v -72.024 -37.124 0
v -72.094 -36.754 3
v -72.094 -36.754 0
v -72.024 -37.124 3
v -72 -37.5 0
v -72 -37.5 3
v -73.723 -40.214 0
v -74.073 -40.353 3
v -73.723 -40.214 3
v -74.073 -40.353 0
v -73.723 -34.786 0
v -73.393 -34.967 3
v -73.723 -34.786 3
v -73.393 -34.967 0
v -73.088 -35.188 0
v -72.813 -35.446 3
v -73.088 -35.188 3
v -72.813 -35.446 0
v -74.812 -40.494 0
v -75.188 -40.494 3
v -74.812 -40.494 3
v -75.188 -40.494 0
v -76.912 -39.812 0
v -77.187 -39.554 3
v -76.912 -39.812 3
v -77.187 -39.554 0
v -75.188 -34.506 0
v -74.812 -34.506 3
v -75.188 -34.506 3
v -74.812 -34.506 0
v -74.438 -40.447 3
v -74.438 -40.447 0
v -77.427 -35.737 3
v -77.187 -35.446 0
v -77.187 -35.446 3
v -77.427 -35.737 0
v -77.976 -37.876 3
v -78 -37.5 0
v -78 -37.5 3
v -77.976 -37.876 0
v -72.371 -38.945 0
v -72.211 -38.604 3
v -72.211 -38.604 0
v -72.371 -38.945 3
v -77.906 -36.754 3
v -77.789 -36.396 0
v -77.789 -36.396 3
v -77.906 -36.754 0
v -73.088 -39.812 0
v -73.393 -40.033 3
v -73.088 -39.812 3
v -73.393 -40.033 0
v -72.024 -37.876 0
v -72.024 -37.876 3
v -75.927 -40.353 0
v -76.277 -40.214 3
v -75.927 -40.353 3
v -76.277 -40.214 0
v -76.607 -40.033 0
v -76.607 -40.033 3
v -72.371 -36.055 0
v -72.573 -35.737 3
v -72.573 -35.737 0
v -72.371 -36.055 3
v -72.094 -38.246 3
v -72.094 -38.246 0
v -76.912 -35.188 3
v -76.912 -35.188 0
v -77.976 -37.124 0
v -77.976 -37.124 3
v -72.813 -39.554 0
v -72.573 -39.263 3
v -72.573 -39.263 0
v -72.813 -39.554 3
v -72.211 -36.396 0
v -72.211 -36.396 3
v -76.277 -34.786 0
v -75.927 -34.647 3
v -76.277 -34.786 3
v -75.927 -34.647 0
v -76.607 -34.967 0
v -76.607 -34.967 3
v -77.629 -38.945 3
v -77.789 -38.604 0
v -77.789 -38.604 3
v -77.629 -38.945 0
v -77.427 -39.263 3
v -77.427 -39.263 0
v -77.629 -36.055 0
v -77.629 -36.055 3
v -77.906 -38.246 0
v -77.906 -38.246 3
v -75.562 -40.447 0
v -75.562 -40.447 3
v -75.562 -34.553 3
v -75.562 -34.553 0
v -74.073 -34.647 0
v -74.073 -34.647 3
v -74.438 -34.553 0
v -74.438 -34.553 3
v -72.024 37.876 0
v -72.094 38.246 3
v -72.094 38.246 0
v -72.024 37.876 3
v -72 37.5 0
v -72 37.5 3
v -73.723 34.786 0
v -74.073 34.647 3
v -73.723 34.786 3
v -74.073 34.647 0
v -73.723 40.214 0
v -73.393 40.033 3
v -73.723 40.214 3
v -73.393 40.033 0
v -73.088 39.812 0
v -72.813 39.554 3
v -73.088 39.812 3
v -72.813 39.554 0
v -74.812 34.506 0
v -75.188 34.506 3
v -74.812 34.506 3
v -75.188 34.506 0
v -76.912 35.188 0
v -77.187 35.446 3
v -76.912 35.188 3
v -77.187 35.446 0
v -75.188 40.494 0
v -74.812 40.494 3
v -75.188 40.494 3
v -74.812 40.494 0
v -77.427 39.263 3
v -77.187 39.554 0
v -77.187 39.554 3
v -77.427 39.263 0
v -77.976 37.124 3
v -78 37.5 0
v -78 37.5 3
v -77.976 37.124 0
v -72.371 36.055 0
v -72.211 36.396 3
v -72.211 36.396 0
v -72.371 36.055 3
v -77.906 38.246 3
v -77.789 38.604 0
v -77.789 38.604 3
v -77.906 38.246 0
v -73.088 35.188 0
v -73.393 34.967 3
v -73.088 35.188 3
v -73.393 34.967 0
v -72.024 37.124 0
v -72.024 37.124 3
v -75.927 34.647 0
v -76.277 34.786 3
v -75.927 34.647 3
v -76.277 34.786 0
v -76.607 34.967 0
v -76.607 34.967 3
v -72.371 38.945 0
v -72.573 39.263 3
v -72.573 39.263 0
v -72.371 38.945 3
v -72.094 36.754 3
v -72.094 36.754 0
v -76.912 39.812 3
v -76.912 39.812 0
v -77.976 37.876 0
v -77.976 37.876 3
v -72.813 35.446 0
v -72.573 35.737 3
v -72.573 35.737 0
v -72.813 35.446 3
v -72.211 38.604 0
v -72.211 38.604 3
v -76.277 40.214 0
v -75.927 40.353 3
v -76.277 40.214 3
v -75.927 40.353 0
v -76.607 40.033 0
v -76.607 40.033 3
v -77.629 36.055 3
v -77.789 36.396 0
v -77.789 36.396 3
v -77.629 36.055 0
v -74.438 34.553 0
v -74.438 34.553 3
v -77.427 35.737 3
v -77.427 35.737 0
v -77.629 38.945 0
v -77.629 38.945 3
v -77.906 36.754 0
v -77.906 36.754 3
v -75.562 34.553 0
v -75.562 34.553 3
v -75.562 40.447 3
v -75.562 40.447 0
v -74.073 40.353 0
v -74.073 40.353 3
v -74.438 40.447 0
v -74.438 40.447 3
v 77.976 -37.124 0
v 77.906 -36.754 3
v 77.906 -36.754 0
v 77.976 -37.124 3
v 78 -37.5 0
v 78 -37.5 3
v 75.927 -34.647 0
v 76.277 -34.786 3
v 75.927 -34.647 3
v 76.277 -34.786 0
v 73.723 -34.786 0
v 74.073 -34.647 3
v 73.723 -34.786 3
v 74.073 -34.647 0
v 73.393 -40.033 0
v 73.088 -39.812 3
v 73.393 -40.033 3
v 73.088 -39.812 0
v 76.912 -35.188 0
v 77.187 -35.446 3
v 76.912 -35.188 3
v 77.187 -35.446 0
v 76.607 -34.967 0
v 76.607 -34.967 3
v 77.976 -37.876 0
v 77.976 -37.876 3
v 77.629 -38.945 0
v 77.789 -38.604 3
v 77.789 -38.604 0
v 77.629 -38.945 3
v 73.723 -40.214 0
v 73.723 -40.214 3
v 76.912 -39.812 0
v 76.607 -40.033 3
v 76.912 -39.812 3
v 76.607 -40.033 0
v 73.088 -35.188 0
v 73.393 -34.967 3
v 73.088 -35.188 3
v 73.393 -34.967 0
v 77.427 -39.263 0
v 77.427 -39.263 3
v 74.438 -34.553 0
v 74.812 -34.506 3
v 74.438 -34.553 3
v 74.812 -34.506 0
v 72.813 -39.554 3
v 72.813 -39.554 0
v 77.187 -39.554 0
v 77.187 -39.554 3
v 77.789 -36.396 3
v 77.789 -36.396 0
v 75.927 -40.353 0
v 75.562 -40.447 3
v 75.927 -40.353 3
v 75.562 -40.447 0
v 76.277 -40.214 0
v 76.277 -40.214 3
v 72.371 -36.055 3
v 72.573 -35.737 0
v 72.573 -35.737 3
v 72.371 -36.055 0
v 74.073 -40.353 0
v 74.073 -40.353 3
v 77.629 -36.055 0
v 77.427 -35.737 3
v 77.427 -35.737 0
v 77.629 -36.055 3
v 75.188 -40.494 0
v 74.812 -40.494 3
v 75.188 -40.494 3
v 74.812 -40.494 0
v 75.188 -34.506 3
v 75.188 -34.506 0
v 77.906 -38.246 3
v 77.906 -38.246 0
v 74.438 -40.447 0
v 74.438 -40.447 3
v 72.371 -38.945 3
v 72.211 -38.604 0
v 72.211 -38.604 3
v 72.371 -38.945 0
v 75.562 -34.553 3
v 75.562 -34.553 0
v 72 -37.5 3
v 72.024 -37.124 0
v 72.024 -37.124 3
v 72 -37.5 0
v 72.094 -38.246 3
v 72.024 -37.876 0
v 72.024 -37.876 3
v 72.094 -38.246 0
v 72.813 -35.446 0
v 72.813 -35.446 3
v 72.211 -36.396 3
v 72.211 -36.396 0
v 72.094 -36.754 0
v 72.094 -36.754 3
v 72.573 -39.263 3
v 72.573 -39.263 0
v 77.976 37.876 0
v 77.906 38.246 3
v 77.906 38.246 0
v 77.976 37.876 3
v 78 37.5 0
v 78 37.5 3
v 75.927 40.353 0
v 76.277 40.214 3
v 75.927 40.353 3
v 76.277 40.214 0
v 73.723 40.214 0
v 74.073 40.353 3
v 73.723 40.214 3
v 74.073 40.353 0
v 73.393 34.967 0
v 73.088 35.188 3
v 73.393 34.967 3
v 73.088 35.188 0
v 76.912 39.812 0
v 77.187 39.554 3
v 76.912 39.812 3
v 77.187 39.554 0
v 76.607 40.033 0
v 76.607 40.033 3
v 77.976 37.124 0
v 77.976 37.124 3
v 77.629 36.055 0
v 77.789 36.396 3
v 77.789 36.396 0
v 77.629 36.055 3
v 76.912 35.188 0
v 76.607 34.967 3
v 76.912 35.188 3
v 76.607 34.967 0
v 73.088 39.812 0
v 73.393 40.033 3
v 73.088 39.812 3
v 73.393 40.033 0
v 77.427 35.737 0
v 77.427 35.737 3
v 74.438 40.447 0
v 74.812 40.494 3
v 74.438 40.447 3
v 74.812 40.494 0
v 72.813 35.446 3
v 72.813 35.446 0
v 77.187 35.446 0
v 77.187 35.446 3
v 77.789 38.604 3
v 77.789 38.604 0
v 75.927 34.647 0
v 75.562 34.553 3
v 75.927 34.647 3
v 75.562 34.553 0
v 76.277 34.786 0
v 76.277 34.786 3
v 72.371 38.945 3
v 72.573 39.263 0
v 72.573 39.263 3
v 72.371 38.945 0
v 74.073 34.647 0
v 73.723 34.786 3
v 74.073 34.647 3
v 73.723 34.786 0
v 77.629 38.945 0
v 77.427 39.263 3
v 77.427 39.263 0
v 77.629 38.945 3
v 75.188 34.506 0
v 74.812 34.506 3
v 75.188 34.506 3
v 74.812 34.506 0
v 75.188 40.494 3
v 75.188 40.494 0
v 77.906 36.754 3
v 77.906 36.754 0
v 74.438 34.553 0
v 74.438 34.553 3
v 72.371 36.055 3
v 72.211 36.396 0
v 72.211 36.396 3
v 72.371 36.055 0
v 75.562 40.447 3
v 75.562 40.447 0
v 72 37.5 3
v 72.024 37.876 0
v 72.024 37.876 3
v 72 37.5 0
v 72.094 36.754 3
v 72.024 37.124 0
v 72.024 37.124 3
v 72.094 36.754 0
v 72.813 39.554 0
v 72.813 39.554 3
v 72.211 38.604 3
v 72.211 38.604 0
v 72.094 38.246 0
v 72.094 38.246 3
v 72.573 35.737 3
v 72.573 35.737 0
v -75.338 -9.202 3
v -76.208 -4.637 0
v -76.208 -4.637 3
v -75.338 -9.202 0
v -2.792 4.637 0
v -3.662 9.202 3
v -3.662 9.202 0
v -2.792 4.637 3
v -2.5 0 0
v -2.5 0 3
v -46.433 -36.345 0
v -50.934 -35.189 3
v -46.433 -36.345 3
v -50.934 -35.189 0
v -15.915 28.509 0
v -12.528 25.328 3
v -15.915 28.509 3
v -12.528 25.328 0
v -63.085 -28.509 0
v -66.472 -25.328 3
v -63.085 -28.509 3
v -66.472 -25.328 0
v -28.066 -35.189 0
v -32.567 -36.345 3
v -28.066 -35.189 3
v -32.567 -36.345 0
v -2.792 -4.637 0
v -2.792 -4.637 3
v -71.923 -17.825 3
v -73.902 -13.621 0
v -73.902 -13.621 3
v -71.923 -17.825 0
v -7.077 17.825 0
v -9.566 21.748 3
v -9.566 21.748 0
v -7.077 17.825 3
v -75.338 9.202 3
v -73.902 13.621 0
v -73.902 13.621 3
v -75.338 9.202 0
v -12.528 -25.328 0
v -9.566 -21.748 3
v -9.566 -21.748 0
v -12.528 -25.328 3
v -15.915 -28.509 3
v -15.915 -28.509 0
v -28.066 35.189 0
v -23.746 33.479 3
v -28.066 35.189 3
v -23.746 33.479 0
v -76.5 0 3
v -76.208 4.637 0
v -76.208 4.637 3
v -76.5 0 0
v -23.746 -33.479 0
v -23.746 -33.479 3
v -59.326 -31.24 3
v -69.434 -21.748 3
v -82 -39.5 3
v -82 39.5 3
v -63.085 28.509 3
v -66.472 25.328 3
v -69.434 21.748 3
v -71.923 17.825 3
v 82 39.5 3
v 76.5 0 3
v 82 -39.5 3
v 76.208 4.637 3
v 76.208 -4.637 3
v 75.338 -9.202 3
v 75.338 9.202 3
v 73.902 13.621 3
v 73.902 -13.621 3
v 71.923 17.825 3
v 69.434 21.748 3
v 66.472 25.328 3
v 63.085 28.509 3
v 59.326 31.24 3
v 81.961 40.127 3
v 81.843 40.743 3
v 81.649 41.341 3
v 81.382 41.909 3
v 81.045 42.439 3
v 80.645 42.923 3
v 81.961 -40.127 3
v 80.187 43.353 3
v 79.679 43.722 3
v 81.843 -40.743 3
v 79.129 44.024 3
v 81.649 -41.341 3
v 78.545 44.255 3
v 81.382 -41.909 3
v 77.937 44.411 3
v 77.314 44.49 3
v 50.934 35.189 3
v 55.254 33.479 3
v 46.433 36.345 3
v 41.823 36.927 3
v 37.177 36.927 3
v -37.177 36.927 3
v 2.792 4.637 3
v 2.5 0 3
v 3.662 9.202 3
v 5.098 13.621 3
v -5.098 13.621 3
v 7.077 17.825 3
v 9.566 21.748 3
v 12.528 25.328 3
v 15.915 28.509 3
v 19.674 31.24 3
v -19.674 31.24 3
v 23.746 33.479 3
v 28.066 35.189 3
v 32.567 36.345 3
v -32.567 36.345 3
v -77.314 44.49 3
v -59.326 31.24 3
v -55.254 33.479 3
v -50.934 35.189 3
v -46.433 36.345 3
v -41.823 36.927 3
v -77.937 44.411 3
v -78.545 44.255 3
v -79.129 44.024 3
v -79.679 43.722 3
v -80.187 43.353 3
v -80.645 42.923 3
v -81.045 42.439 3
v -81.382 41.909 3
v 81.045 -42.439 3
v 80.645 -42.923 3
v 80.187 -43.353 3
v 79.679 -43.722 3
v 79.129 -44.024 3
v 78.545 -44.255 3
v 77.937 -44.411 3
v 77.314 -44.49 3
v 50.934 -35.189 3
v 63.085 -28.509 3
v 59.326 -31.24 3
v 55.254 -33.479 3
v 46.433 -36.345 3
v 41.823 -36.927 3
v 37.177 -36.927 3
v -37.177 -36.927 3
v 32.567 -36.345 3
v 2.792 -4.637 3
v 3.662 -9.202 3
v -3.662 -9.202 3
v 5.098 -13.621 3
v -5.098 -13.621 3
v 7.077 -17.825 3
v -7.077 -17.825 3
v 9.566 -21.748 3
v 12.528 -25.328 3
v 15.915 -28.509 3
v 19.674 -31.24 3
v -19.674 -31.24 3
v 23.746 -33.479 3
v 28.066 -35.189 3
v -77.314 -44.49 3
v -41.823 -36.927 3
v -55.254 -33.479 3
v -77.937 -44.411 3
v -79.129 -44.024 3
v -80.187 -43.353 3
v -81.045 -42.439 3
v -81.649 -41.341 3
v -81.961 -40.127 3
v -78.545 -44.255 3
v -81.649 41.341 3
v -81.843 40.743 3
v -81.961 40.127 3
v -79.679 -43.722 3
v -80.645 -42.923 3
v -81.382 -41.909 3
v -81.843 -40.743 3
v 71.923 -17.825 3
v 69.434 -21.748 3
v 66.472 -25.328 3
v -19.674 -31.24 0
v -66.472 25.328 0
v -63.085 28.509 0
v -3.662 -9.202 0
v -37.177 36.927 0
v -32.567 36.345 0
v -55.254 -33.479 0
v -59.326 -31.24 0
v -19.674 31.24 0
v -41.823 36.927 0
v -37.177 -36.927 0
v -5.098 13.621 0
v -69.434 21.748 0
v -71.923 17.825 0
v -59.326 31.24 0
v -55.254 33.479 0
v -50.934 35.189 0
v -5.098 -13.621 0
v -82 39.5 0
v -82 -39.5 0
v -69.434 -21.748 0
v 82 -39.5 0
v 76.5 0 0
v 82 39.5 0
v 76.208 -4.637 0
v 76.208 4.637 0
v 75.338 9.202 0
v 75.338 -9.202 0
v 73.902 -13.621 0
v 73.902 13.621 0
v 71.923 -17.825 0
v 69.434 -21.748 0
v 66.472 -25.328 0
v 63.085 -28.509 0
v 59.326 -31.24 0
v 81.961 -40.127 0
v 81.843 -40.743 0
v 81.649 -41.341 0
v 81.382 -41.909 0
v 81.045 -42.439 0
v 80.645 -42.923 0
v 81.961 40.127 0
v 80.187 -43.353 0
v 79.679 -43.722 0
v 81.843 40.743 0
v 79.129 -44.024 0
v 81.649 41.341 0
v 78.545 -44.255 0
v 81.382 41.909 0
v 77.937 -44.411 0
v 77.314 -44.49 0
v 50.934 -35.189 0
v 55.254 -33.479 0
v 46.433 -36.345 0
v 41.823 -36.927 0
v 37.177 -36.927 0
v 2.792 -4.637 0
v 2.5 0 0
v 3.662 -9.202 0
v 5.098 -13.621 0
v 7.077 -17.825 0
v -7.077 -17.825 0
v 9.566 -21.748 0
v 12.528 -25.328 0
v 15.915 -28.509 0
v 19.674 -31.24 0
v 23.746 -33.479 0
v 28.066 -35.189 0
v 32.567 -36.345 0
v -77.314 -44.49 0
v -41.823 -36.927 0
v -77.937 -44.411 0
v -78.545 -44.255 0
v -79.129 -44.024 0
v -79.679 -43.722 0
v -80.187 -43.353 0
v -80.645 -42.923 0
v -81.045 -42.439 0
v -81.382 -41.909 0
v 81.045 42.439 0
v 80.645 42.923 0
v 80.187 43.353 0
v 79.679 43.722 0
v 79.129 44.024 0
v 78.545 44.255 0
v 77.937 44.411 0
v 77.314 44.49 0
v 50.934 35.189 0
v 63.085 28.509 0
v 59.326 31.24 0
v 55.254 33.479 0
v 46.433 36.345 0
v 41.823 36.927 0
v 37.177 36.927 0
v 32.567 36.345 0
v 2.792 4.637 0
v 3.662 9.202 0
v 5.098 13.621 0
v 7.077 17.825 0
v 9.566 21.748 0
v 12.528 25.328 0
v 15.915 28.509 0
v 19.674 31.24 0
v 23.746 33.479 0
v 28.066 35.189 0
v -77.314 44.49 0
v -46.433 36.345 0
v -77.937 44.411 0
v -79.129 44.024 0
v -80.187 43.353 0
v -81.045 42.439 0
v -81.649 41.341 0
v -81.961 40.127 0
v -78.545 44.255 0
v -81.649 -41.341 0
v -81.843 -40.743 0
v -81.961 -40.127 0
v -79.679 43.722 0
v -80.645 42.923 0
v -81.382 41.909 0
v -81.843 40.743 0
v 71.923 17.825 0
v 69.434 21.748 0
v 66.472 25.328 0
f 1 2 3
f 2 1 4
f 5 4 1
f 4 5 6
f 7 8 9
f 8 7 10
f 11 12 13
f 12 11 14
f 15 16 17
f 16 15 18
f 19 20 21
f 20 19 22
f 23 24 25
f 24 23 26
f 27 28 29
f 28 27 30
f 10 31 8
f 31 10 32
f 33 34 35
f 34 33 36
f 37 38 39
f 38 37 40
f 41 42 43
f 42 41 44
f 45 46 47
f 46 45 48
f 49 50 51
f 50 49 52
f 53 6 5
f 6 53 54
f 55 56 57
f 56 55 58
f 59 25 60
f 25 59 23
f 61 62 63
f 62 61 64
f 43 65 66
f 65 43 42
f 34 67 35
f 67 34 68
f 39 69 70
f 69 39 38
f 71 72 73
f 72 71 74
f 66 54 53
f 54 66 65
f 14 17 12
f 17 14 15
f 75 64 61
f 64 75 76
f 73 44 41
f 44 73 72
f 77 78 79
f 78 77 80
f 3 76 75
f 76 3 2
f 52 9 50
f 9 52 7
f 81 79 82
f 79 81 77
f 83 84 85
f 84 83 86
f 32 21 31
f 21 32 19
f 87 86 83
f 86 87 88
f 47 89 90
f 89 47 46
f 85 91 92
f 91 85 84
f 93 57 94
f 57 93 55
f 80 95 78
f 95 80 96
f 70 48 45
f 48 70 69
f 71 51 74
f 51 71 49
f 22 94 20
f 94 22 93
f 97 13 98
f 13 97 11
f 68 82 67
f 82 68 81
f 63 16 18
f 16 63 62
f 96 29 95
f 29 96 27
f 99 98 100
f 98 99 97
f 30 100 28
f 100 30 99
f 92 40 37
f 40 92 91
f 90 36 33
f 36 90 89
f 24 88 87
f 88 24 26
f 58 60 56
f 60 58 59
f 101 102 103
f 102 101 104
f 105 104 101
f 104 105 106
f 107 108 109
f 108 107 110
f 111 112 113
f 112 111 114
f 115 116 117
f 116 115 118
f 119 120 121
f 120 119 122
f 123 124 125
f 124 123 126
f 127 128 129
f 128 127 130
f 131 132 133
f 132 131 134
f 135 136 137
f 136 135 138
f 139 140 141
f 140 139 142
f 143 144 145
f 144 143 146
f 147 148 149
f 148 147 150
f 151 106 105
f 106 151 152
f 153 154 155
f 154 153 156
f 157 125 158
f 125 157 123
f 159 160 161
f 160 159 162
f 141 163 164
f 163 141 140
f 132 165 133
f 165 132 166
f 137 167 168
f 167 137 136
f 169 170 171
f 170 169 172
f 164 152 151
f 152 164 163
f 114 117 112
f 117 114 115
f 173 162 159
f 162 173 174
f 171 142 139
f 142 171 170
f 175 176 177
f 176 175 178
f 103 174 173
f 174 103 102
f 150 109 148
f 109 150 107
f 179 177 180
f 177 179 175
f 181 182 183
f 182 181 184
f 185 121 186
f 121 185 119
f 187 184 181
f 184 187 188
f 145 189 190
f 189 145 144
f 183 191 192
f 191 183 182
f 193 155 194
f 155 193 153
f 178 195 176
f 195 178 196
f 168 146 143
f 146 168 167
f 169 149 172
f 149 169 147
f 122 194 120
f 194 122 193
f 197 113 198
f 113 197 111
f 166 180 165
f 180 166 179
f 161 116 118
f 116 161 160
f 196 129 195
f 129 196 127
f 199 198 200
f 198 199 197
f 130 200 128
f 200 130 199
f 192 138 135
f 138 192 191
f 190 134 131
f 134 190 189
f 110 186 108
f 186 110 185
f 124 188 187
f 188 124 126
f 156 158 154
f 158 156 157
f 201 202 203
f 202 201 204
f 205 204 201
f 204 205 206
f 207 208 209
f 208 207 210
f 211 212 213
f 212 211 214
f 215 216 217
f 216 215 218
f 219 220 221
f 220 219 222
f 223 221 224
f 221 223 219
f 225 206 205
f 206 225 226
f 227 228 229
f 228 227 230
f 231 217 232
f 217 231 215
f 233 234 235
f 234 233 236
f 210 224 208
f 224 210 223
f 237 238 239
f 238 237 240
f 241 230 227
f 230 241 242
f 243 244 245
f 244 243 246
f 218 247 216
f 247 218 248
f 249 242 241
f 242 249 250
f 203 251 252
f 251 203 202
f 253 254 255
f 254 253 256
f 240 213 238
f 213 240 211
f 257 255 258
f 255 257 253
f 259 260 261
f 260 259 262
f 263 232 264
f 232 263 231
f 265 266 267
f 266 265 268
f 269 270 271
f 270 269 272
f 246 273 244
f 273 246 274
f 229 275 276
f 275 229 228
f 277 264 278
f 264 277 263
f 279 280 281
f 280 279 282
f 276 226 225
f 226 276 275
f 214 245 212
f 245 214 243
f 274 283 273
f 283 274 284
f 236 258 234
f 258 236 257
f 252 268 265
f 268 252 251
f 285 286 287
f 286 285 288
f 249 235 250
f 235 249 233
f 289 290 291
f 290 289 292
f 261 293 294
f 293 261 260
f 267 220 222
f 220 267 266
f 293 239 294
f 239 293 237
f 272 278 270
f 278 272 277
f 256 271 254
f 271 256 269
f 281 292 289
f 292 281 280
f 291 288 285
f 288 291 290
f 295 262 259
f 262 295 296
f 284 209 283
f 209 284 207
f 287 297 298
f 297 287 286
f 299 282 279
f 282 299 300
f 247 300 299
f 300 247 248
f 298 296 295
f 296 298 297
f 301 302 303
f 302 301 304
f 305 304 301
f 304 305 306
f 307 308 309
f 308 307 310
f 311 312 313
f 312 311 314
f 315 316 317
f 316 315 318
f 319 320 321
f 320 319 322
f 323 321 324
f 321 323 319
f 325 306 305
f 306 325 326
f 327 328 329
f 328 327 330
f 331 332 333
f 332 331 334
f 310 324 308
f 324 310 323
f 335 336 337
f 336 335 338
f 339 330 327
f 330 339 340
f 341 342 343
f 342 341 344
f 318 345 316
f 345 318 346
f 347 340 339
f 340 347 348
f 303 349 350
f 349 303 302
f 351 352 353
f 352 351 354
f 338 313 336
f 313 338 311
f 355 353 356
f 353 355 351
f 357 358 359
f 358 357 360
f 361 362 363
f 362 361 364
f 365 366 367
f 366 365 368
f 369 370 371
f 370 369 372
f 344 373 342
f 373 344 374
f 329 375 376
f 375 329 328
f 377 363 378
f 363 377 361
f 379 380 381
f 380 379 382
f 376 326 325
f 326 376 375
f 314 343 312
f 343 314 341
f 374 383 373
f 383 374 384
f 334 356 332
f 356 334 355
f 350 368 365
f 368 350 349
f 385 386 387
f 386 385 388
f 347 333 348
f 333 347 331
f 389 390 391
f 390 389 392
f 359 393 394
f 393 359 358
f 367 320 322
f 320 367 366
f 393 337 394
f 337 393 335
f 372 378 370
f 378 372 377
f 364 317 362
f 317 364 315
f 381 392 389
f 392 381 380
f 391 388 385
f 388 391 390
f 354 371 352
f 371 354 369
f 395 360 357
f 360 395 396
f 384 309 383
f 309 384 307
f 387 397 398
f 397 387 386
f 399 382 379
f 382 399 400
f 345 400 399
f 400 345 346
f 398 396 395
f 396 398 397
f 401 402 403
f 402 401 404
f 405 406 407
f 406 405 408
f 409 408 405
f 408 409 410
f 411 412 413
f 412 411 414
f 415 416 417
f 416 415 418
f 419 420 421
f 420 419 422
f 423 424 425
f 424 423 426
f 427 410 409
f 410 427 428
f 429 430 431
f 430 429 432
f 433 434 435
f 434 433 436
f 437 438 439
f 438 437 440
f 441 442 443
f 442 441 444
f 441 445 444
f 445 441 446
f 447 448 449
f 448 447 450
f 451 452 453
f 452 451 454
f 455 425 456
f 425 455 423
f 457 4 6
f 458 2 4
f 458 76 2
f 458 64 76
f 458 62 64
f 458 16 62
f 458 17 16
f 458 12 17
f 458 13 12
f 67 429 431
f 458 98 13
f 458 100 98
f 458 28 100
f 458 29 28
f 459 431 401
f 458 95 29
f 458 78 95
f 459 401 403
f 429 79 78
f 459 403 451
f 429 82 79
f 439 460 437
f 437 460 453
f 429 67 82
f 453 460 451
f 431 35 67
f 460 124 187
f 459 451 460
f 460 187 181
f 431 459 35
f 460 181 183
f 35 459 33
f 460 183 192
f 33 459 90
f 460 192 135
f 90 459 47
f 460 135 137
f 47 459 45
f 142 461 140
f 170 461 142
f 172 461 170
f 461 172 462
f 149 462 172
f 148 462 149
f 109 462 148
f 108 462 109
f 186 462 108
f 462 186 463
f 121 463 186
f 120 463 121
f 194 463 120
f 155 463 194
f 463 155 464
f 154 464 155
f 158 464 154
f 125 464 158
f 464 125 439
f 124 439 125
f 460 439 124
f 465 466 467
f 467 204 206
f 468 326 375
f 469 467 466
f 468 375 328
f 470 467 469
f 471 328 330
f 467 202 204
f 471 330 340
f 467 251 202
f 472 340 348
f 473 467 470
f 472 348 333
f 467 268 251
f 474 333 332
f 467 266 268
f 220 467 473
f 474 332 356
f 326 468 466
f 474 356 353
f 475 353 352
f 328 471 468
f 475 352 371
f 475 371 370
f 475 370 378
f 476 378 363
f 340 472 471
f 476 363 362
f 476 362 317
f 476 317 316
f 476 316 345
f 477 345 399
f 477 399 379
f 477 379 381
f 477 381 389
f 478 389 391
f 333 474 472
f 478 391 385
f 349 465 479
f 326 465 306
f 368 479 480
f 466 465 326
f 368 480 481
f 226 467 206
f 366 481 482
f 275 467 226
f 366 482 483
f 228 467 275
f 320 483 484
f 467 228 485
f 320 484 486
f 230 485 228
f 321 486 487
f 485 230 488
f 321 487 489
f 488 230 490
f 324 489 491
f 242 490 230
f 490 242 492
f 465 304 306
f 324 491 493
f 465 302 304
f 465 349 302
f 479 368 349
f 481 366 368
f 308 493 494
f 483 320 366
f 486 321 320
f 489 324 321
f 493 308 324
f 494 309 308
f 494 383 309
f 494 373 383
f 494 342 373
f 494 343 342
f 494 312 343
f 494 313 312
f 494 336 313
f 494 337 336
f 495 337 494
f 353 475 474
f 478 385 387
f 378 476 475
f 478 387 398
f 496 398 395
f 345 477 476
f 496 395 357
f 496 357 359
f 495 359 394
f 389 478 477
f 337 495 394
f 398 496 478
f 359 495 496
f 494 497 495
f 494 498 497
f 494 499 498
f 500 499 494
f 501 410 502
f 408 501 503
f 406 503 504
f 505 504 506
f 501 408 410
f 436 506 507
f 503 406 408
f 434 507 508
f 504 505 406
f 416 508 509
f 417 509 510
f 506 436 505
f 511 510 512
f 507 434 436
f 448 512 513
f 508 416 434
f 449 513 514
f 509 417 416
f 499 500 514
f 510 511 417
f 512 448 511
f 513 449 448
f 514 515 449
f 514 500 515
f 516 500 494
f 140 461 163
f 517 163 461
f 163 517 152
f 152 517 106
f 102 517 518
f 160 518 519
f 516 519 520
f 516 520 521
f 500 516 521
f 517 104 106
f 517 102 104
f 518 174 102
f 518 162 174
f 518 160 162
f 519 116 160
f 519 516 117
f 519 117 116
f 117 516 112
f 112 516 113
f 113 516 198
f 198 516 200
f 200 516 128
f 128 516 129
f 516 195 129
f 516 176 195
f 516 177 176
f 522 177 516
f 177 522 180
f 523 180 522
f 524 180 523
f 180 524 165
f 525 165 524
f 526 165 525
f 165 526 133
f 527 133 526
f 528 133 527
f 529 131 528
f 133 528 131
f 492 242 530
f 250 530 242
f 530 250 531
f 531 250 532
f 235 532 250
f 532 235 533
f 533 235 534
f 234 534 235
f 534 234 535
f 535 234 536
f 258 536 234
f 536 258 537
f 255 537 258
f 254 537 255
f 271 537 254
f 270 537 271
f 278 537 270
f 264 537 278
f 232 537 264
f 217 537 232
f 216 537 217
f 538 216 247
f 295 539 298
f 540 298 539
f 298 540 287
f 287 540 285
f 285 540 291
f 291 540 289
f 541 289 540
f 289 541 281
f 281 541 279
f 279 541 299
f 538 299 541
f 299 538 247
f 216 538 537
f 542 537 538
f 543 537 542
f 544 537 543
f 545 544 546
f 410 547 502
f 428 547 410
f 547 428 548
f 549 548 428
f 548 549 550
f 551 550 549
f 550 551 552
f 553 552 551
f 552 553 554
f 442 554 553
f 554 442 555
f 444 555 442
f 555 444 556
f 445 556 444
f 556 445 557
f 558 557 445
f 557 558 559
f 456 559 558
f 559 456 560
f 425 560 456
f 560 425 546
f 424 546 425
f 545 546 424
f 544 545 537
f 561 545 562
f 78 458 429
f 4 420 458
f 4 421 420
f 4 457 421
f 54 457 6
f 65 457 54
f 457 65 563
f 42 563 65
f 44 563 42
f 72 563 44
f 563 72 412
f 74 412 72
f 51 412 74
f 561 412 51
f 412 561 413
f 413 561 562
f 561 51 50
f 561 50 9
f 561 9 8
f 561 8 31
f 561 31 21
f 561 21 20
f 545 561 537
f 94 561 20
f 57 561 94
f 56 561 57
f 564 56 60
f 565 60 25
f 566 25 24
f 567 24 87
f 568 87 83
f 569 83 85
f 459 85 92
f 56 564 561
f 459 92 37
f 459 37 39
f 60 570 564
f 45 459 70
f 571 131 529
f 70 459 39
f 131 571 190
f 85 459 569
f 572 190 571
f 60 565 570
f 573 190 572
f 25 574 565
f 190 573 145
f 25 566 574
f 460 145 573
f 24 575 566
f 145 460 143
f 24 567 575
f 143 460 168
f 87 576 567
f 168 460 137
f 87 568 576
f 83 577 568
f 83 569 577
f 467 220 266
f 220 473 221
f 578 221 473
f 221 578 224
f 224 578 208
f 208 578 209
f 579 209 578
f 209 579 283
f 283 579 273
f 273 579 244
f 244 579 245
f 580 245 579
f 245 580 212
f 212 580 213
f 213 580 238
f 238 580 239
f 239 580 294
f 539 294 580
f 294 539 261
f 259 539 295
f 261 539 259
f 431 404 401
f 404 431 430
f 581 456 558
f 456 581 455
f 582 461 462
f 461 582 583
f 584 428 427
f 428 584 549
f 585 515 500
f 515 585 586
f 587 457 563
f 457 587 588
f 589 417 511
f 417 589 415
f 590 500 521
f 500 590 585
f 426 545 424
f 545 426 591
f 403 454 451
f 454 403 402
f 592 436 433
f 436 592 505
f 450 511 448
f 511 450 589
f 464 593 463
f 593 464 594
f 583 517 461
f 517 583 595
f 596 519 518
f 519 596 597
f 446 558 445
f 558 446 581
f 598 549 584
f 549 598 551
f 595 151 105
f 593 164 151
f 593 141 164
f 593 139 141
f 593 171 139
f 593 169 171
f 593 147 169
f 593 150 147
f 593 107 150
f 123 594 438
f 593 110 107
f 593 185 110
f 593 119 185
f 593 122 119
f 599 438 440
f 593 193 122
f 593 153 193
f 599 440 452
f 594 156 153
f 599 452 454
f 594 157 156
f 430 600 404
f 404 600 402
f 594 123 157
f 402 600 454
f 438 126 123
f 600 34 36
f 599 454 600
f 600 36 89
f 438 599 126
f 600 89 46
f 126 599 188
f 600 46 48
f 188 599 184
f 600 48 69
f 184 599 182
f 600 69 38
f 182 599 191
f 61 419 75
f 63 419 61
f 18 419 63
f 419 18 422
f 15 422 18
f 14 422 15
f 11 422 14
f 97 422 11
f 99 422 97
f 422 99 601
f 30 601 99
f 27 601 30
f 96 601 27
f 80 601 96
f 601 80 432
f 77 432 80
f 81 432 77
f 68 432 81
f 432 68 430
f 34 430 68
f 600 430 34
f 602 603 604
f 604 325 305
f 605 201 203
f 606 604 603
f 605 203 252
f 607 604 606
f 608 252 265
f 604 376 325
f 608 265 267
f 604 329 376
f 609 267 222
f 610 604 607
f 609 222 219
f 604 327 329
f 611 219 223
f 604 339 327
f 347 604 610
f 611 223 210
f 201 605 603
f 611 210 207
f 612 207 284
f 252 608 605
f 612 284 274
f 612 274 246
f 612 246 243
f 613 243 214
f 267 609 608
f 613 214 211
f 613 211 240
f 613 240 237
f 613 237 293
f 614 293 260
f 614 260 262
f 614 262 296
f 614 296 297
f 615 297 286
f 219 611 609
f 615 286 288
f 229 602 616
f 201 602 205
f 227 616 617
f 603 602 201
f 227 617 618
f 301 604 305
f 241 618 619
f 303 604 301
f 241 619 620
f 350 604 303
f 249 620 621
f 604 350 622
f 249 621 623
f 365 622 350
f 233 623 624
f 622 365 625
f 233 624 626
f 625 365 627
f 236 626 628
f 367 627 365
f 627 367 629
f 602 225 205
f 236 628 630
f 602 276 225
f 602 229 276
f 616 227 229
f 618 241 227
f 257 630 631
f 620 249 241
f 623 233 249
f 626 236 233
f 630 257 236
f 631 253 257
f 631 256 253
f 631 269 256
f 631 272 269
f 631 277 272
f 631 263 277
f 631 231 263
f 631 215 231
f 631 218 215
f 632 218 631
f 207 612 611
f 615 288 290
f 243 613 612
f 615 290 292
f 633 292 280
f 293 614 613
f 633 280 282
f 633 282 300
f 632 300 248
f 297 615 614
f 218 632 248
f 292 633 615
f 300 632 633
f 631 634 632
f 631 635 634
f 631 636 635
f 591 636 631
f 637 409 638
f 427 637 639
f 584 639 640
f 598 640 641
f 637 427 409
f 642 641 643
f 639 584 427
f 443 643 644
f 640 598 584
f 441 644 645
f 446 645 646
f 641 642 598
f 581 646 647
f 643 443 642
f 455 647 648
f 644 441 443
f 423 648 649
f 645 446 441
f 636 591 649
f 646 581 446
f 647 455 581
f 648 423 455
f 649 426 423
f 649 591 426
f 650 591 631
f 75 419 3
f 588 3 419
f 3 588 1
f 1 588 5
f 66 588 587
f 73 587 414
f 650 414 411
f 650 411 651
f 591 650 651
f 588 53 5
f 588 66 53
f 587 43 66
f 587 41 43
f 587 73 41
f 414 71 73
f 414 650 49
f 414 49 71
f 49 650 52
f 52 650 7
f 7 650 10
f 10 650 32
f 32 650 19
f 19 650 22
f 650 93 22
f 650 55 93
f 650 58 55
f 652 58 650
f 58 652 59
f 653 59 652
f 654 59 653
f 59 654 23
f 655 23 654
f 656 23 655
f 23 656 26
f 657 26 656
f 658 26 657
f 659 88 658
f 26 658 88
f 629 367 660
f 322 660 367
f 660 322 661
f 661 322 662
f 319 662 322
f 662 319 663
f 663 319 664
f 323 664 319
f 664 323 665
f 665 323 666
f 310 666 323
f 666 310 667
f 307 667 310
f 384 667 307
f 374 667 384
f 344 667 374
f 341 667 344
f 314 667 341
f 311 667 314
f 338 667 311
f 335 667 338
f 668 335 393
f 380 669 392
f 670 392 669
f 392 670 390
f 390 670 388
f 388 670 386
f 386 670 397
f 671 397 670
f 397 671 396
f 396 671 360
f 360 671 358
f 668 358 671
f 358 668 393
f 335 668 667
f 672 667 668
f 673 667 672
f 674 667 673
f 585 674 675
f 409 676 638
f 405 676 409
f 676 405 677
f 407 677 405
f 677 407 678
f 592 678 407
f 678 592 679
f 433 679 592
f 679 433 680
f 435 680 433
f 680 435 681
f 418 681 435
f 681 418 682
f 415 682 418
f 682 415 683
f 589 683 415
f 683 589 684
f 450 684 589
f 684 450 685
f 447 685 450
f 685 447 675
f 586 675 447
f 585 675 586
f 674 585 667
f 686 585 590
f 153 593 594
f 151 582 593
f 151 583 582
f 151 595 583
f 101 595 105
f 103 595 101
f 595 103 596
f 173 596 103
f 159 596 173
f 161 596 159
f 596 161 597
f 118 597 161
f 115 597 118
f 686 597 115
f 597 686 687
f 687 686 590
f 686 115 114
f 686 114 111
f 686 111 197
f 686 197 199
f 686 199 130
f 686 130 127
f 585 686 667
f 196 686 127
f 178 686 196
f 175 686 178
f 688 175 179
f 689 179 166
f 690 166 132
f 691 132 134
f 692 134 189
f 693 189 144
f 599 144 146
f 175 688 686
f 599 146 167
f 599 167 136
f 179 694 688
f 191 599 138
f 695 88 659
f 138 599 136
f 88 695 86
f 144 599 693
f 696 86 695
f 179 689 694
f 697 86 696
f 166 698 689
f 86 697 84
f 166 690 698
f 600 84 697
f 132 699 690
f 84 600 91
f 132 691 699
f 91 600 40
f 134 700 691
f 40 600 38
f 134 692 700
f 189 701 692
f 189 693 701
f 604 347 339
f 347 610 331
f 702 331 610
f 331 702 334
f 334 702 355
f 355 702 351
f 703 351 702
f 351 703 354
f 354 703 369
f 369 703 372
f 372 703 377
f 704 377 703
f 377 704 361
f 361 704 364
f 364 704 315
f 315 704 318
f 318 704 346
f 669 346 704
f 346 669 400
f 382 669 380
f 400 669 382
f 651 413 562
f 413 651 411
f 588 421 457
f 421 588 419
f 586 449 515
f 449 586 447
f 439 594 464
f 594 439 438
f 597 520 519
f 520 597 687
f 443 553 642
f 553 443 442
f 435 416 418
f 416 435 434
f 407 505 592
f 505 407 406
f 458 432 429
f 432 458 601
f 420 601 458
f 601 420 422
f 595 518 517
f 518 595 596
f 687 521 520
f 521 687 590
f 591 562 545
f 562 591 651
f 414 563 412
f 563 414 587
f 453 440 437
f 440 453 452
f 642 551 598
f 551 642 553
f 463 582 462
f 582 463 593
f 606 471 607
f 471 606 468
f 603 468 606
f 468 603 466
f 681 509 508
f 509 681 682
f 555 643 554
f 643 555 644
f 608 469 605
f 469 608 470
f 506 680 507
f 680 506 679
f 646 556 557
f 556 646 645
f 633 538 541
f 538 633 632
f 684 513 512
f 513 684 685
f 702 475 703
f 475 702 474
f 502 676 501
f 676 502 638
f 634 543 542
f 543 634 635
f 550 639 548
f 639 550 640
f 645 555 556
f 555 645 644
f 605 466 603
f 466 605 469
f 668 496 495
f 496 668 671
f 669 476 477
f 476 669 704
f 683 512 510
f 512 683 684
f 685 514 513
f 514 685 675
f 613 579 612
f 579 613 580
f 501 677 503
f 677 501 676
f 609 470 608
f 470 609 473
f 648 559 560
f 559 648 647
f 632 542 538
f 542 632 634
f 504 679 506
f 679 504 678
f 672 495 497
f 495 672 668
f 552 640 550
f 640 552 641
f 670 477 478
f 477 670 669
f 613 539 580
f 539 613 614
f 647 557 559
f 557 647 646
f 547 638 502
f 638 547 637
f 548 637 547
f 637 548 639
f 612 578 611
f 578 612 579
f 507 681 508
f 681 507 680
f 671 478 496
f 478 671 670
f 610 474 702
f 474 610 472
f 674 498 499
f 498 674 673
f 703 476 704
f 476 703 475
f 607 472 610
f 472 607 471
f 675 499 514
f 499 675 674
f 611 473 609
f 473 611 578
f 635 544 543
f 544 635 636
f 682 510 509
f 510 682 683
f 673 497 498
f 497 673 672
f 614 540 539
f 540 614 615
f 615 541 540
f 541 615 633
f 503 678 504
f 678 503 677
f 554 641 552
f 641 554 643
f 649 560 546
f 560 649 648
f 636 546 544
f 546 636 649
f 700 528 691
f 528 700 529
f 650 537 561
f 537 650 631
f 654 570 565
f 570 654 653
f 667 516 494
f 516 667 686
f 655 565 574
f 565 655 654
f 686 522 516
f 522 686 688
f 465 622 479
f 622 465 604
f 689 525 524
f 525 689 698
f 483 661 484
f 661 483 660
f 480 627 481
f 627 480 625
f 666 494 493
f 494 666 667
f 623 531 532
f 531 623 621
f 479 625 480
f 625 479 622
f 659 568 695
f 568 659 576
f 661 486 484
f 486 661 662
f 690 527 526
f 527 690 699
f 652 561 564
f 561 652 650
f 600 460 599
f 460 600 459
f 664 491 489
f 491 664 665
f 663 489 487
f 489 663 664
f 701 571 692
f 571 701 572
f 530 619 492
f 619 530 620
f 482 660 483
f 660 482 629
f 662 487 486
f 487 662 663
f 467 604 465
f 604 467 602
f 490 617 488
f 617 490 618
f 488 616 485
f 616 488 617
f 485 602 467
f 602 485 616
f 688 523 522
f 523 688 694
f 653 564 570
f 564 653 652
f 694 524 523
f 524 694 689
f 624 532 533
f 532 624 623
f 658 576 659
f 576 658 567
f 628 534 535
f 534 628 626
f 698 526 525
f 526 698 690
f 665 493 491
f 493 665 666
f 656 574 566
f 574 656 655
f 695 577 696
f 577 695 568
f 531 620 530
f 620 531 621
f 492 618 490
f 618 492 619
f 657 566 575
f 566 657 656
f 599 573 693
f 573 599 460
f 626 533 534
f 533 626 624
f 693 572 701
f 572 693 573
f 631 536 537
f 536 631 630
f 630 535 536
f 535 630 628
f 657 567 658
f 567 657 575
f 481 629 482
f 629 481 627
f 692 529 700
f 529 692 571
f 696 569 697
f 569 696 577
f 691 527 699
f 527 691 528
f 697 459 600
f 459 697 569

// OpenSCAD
$fn = 50;


difference() {
	union() {
		hull() {
			translate(v = [-77.0000000000, 39.5000000000, 0]) {
				cylinder(h = 3, r = 5);
			}
			translate(v = [77.0000000000, 39.5000000000, 0]) {
				cylinder(h = 3, r = 5);
			}
			translate(v = [-77.0000000000, -39.5000000000, 0]) {
				cylinder(h = 3, r = 5);
			}
			translate(v = [77.0000000000, -39.5000000000, 0]) {
				cylinder(h = 3, r = 5);
			}
		}
	}
	union() {
		#translate(v = [-75.0000000000, -37.5000000000, -100.0000000000]) {
			cylinder(h = 200, r = 3.0000000000);
		}
		#translate(v = [-75.0000000000, 37.5000000000, -100.0000000000]) {
			cylinder(h = 200, r = 3.0000000000);
		}
		#translate(v = [75.0000000000, -37.5000000000, -100.0000000000]) {
			cylinder(h = 200, r = 3.0000000000);
		}
		#translate(v = [75.0000000000, 37.5000000000, -100.0000000000]) {
			cylinder(h = 200, r = 3.0000000000);
		}
		#translate(v = [-39.5000000000, 0, 0]) {
			cylinder(h = 3, r = 37.0000000000);
		}
		#translate(v = [39.5000000000, 0, 0]) {
			cylinder(h = 3, r = 37.0000000000);
		}
	}
}
